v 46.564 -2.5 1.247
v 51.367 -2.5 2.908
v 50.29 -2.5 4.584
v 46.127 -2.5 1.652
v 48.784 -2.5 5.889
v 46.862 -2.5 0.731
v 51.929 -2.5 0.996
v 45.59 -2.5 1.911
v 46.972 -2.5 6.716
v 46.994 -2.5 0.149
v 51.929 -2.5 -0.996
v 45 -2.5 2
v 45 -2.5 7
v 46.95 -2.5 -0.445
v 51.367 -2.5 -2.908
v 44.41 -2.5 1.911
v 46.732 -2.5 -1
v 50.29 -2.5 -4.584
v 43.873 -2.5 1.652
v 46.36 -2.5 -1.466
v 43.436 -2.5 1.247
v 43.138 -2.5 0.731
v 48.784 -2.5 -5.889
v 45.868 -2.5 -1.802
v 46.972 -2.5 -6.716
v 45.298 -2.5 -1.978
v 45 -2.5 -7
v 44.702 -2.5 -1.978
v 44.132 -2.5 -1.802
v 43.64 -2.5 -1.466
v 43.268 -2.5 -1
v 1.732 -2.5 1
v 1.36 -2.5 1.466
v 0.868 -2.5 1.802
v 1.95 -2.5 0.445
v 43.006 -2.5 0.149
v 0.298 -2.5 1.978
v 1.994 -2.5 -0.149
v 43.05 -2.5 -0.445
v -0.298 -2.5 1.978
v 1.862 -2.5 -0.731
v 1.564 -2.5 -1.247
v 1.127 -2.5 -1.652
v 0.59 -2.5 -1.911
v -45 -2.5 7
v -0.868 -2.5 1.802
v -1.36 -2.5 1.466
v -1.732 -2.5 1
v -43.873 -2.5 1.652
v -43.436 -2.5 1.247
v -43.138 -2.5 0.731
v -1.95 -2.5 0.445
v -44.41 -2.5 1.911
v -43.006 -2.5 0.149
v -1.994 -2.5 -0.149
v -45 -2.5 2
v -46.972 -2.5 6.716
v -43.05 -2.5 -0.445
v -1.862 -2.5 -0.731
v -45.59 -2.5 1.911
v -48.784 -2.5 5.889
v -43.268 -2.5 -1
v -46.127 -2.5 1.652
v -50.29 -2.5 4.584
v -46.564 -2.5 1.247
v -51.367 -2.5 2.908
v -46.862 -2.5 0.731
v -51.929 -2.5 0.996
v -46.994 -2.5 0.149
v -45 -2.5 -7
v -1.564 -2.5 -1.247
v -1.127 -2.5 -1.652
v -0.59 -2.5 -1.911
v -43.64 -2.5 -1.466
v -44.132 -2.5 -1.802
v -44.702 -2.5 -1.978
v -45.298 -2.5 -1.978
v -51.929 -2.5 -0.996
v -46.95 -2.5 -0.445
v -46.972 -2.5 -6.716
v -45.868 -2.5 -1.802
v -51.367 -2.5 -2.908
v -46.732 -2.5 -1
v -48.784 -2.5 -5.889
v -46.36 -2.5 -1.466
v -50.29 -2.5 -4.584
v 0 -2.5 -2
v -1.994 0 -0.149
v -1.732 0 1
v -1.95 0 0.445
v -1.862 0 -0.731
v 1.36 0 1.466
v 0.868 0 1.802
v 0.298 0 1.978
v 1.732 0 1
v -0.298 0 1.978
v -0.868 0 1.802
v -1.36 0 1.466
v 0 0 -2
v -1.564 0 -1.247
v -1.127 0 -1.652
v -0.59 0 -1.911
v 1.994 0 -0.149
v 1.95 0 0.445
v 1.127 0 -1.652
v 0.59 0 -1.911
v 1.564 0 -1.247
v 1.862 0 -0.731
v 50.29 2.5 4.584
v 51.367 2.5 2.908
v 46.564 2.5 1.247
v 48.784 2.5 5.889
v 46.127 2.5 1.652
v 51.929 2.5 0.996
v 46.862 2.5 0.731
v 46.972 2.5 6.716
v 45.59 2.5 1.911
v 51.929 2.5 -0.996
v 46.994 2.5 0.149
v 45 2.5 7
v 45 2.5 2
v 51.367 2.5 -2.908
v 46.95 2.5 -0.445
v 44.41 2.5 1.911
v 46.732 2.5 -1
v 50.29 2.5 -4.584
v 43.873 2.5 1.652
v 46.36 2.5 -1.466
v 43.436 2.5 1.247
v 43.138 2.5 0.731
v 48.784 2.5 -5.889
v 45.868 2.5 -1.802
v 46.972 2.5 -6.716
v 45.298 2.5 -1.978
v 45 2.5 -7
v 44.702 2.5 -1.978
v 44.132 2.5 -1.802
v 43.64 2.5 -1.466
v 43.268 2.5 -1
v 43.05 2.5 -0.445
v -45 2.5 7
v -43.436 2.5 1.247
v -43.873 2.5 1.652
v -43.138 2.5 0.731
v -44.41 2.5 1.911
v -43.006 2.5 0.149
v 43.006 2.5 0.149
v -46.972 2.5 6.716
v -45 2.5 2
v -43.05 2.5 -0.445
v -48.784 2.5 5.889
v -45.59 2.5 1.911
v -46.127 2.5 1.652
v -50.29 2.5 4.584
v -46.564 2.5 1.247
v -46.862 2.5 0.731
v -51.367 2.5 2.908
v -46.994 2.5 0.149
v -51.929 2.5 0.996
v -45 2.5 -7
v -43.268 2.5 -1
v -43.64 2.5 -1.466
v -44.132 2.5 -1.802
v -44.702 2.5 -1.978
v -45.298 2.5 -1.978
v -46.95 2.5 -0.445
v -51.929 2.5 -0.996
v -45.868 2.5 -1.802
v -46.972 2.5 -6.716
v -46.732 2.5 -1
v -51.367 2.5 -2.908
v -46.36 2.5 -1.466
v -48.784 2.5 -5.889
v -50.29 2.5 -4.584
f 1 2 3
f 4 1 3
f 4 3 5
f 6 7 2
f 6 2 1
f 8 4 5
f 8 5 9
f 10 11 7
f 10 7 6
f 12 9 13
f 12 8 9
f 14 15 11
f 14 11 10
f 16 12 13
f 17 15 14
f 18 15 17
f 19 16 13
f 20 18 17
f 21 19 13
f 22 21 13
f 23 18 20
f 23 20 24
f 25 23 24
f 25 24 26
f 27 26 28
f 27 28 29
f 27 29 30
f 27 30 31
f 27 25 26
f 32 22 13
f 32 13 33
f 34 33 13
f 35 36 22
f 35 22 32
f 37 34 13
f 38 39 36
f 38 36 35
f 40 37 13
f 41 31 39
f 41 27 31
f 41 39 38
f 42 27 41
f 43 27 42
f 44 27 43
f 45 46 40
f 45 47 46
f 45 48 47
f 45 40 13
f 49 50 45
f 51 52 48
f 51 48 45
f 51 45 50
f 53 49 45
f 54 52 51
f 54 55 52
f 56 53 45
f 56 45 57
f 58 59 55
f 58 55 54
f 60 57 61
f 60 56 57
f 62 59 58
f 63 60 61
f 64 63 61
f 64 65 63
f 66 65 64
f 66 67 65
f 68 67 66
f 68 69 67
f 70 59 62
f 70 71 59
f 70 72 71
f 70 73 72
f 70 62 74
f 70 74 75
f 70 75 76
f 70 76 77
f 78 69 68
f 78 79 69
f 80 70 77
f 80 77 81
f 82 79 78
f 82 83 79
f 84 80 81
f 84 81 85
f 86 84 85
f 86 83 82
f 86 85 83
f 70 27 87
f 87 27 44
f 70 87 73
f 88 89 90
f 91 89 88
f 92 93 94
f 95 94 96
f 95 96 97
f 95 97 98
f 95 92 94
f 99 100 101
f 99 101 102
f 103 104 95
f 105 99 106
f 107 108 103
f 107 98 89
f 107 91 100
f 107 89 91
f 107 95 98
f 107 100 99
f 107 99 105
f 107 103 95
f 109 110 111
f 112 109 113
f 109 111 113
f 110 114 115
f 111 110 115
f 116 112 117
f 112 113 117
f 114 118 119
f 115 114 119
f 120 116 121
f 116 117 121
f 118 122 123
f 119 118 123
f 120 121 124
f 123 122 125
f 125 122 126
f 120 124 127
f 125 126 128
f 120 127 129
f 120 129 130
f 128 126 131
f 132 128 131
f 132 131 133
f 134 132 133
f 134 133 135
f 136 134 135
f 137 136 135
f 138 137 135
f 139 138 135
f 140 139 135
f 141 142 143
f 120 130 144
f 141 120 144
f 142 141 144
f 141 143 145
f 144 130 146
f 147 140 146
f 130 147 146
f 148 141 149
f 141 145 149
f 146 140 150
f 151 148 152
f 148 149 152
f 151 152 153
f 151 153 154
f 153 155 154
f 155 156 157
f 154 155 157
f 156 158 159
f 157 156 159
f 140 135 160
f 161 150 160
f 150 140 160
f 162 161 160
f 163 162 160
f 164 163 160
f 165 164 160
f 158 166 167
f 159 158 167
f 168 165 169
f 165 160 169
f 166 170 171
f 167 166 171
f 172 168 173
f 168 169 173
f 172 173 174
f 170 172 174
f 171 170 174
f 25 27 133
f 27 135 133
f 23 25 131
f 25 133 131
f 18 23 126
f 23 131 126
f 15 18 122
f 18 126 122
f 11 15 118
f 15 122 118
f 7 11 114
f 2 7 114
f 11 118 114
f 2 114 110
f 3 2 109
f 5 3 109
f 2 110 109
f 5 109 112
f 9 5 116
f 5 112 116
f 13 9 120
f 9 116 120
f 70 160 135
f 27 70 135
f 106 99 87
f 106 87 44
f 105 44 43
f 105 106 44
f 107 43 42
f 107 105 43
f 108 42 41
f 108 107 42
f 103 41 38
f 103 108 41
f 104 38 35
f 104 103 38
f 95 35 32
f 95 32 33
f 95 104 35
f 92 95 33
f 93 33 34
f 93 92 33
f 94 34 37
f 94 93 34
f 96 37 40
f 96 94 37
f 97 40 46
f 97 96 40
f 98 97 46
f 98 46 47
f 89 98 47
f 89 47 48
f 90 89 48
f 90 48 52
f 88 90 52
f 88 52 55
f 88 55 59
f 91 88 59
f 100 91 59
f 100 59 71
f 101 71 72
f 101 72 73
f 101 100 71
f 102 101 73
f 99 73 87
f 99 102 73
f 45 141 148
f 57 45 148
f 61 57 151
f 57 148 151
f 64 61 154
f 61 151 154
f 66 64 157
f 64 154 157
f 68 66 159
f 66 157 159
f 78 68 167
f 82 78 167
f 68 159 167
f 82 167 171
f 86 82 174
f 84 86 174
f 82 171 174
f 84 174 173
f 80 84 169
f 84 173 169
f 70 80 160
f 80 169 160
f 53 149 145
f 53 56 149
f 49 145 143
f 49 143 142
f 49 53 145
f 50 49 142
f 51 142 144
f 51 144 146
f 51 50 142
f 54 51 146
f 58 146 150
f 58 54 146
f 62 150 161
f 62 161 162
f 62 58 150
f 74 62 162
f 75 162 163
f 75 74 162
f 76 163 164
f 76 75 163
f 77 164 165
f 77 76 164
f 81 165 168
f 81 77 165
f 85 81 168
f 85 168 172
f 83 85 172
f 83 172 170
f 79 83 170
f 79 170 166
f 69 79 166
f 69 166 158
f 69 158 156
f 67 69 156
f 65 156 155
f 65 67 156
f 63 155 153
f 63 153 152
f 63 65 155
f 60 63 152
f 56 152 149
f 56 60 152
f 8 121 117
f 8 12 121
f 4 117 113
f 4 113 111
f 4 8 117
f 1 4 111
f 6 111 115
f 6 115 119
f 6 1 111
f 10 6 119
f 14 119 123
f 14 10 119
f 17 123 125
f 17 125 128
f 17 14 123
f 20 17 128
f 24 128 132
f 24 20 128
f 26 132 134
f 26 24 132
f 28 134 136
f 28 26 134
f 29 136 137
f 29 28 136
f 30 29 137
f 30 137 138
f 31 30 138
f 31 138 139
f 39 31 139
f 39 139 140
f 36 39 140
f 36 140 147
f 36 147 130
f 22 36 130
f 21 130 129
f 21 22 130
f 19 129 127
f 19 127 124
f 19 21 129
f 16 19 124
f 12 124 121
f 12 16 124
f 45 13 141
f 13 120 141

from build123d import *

# Parameters (mm, degrees)
IZIM1_R                     = 2
Y_KSEKLIK_EKSTR_ZYON1_DEPTH = 2.5
KES_EKSTR_ZYON1_START       = -2.5
IZIM2_R                     = 2
KES_EKSTR_ZYON1_DEPTH       = 2.5


with BuildPart() as part:
    # Çizim1 → Yükseklik-Ekstrüzyon1 (new, symmetric)
    with BuildSketch(Plane(origin=(0, 0, 0), x_dir=(1, 0, 0), z_dir=(0, 1, 0))):
        with BuildLine():
            Line((-45, 7), (45, 7))
            ThreePointArc((45, 7), (52, 0), (45, -7))
            Line((45, -7), (-45, -7))
            ThreePointArc((-45, -7), (-52, 0), (-45, 7))
        make_face()
        with Locations(Location((-45, 0, 0), (0, 0, 270))):
            Circle(IZIM1_R, mode=Mode.SUBTRACT)
        with Locations(Location((45, 0, 0), (0, 0, 270))):
            Circle(IZIM1_R, mode=Mode.SUBTRACT)
    extrude(amount=Y_KSEKLIK_EKSTR_ZYON1_DEPTH, both=True)

    # Çizim2 → Kes-Ekstrüzyon1 (cut)
    with BuildSketch(Plane.XZ.offset(2.5).offset(KES_EKSTR_ZYON1_START)):
        with Locations(Location((0, 0, 0), (0, 0, 270))):
            Circle(IZIM2_R)
    extrude(amount=KES_EKSTR_ZYON1_DEPTH, mode=Mode.SUBTRACT)


solid = part.part
